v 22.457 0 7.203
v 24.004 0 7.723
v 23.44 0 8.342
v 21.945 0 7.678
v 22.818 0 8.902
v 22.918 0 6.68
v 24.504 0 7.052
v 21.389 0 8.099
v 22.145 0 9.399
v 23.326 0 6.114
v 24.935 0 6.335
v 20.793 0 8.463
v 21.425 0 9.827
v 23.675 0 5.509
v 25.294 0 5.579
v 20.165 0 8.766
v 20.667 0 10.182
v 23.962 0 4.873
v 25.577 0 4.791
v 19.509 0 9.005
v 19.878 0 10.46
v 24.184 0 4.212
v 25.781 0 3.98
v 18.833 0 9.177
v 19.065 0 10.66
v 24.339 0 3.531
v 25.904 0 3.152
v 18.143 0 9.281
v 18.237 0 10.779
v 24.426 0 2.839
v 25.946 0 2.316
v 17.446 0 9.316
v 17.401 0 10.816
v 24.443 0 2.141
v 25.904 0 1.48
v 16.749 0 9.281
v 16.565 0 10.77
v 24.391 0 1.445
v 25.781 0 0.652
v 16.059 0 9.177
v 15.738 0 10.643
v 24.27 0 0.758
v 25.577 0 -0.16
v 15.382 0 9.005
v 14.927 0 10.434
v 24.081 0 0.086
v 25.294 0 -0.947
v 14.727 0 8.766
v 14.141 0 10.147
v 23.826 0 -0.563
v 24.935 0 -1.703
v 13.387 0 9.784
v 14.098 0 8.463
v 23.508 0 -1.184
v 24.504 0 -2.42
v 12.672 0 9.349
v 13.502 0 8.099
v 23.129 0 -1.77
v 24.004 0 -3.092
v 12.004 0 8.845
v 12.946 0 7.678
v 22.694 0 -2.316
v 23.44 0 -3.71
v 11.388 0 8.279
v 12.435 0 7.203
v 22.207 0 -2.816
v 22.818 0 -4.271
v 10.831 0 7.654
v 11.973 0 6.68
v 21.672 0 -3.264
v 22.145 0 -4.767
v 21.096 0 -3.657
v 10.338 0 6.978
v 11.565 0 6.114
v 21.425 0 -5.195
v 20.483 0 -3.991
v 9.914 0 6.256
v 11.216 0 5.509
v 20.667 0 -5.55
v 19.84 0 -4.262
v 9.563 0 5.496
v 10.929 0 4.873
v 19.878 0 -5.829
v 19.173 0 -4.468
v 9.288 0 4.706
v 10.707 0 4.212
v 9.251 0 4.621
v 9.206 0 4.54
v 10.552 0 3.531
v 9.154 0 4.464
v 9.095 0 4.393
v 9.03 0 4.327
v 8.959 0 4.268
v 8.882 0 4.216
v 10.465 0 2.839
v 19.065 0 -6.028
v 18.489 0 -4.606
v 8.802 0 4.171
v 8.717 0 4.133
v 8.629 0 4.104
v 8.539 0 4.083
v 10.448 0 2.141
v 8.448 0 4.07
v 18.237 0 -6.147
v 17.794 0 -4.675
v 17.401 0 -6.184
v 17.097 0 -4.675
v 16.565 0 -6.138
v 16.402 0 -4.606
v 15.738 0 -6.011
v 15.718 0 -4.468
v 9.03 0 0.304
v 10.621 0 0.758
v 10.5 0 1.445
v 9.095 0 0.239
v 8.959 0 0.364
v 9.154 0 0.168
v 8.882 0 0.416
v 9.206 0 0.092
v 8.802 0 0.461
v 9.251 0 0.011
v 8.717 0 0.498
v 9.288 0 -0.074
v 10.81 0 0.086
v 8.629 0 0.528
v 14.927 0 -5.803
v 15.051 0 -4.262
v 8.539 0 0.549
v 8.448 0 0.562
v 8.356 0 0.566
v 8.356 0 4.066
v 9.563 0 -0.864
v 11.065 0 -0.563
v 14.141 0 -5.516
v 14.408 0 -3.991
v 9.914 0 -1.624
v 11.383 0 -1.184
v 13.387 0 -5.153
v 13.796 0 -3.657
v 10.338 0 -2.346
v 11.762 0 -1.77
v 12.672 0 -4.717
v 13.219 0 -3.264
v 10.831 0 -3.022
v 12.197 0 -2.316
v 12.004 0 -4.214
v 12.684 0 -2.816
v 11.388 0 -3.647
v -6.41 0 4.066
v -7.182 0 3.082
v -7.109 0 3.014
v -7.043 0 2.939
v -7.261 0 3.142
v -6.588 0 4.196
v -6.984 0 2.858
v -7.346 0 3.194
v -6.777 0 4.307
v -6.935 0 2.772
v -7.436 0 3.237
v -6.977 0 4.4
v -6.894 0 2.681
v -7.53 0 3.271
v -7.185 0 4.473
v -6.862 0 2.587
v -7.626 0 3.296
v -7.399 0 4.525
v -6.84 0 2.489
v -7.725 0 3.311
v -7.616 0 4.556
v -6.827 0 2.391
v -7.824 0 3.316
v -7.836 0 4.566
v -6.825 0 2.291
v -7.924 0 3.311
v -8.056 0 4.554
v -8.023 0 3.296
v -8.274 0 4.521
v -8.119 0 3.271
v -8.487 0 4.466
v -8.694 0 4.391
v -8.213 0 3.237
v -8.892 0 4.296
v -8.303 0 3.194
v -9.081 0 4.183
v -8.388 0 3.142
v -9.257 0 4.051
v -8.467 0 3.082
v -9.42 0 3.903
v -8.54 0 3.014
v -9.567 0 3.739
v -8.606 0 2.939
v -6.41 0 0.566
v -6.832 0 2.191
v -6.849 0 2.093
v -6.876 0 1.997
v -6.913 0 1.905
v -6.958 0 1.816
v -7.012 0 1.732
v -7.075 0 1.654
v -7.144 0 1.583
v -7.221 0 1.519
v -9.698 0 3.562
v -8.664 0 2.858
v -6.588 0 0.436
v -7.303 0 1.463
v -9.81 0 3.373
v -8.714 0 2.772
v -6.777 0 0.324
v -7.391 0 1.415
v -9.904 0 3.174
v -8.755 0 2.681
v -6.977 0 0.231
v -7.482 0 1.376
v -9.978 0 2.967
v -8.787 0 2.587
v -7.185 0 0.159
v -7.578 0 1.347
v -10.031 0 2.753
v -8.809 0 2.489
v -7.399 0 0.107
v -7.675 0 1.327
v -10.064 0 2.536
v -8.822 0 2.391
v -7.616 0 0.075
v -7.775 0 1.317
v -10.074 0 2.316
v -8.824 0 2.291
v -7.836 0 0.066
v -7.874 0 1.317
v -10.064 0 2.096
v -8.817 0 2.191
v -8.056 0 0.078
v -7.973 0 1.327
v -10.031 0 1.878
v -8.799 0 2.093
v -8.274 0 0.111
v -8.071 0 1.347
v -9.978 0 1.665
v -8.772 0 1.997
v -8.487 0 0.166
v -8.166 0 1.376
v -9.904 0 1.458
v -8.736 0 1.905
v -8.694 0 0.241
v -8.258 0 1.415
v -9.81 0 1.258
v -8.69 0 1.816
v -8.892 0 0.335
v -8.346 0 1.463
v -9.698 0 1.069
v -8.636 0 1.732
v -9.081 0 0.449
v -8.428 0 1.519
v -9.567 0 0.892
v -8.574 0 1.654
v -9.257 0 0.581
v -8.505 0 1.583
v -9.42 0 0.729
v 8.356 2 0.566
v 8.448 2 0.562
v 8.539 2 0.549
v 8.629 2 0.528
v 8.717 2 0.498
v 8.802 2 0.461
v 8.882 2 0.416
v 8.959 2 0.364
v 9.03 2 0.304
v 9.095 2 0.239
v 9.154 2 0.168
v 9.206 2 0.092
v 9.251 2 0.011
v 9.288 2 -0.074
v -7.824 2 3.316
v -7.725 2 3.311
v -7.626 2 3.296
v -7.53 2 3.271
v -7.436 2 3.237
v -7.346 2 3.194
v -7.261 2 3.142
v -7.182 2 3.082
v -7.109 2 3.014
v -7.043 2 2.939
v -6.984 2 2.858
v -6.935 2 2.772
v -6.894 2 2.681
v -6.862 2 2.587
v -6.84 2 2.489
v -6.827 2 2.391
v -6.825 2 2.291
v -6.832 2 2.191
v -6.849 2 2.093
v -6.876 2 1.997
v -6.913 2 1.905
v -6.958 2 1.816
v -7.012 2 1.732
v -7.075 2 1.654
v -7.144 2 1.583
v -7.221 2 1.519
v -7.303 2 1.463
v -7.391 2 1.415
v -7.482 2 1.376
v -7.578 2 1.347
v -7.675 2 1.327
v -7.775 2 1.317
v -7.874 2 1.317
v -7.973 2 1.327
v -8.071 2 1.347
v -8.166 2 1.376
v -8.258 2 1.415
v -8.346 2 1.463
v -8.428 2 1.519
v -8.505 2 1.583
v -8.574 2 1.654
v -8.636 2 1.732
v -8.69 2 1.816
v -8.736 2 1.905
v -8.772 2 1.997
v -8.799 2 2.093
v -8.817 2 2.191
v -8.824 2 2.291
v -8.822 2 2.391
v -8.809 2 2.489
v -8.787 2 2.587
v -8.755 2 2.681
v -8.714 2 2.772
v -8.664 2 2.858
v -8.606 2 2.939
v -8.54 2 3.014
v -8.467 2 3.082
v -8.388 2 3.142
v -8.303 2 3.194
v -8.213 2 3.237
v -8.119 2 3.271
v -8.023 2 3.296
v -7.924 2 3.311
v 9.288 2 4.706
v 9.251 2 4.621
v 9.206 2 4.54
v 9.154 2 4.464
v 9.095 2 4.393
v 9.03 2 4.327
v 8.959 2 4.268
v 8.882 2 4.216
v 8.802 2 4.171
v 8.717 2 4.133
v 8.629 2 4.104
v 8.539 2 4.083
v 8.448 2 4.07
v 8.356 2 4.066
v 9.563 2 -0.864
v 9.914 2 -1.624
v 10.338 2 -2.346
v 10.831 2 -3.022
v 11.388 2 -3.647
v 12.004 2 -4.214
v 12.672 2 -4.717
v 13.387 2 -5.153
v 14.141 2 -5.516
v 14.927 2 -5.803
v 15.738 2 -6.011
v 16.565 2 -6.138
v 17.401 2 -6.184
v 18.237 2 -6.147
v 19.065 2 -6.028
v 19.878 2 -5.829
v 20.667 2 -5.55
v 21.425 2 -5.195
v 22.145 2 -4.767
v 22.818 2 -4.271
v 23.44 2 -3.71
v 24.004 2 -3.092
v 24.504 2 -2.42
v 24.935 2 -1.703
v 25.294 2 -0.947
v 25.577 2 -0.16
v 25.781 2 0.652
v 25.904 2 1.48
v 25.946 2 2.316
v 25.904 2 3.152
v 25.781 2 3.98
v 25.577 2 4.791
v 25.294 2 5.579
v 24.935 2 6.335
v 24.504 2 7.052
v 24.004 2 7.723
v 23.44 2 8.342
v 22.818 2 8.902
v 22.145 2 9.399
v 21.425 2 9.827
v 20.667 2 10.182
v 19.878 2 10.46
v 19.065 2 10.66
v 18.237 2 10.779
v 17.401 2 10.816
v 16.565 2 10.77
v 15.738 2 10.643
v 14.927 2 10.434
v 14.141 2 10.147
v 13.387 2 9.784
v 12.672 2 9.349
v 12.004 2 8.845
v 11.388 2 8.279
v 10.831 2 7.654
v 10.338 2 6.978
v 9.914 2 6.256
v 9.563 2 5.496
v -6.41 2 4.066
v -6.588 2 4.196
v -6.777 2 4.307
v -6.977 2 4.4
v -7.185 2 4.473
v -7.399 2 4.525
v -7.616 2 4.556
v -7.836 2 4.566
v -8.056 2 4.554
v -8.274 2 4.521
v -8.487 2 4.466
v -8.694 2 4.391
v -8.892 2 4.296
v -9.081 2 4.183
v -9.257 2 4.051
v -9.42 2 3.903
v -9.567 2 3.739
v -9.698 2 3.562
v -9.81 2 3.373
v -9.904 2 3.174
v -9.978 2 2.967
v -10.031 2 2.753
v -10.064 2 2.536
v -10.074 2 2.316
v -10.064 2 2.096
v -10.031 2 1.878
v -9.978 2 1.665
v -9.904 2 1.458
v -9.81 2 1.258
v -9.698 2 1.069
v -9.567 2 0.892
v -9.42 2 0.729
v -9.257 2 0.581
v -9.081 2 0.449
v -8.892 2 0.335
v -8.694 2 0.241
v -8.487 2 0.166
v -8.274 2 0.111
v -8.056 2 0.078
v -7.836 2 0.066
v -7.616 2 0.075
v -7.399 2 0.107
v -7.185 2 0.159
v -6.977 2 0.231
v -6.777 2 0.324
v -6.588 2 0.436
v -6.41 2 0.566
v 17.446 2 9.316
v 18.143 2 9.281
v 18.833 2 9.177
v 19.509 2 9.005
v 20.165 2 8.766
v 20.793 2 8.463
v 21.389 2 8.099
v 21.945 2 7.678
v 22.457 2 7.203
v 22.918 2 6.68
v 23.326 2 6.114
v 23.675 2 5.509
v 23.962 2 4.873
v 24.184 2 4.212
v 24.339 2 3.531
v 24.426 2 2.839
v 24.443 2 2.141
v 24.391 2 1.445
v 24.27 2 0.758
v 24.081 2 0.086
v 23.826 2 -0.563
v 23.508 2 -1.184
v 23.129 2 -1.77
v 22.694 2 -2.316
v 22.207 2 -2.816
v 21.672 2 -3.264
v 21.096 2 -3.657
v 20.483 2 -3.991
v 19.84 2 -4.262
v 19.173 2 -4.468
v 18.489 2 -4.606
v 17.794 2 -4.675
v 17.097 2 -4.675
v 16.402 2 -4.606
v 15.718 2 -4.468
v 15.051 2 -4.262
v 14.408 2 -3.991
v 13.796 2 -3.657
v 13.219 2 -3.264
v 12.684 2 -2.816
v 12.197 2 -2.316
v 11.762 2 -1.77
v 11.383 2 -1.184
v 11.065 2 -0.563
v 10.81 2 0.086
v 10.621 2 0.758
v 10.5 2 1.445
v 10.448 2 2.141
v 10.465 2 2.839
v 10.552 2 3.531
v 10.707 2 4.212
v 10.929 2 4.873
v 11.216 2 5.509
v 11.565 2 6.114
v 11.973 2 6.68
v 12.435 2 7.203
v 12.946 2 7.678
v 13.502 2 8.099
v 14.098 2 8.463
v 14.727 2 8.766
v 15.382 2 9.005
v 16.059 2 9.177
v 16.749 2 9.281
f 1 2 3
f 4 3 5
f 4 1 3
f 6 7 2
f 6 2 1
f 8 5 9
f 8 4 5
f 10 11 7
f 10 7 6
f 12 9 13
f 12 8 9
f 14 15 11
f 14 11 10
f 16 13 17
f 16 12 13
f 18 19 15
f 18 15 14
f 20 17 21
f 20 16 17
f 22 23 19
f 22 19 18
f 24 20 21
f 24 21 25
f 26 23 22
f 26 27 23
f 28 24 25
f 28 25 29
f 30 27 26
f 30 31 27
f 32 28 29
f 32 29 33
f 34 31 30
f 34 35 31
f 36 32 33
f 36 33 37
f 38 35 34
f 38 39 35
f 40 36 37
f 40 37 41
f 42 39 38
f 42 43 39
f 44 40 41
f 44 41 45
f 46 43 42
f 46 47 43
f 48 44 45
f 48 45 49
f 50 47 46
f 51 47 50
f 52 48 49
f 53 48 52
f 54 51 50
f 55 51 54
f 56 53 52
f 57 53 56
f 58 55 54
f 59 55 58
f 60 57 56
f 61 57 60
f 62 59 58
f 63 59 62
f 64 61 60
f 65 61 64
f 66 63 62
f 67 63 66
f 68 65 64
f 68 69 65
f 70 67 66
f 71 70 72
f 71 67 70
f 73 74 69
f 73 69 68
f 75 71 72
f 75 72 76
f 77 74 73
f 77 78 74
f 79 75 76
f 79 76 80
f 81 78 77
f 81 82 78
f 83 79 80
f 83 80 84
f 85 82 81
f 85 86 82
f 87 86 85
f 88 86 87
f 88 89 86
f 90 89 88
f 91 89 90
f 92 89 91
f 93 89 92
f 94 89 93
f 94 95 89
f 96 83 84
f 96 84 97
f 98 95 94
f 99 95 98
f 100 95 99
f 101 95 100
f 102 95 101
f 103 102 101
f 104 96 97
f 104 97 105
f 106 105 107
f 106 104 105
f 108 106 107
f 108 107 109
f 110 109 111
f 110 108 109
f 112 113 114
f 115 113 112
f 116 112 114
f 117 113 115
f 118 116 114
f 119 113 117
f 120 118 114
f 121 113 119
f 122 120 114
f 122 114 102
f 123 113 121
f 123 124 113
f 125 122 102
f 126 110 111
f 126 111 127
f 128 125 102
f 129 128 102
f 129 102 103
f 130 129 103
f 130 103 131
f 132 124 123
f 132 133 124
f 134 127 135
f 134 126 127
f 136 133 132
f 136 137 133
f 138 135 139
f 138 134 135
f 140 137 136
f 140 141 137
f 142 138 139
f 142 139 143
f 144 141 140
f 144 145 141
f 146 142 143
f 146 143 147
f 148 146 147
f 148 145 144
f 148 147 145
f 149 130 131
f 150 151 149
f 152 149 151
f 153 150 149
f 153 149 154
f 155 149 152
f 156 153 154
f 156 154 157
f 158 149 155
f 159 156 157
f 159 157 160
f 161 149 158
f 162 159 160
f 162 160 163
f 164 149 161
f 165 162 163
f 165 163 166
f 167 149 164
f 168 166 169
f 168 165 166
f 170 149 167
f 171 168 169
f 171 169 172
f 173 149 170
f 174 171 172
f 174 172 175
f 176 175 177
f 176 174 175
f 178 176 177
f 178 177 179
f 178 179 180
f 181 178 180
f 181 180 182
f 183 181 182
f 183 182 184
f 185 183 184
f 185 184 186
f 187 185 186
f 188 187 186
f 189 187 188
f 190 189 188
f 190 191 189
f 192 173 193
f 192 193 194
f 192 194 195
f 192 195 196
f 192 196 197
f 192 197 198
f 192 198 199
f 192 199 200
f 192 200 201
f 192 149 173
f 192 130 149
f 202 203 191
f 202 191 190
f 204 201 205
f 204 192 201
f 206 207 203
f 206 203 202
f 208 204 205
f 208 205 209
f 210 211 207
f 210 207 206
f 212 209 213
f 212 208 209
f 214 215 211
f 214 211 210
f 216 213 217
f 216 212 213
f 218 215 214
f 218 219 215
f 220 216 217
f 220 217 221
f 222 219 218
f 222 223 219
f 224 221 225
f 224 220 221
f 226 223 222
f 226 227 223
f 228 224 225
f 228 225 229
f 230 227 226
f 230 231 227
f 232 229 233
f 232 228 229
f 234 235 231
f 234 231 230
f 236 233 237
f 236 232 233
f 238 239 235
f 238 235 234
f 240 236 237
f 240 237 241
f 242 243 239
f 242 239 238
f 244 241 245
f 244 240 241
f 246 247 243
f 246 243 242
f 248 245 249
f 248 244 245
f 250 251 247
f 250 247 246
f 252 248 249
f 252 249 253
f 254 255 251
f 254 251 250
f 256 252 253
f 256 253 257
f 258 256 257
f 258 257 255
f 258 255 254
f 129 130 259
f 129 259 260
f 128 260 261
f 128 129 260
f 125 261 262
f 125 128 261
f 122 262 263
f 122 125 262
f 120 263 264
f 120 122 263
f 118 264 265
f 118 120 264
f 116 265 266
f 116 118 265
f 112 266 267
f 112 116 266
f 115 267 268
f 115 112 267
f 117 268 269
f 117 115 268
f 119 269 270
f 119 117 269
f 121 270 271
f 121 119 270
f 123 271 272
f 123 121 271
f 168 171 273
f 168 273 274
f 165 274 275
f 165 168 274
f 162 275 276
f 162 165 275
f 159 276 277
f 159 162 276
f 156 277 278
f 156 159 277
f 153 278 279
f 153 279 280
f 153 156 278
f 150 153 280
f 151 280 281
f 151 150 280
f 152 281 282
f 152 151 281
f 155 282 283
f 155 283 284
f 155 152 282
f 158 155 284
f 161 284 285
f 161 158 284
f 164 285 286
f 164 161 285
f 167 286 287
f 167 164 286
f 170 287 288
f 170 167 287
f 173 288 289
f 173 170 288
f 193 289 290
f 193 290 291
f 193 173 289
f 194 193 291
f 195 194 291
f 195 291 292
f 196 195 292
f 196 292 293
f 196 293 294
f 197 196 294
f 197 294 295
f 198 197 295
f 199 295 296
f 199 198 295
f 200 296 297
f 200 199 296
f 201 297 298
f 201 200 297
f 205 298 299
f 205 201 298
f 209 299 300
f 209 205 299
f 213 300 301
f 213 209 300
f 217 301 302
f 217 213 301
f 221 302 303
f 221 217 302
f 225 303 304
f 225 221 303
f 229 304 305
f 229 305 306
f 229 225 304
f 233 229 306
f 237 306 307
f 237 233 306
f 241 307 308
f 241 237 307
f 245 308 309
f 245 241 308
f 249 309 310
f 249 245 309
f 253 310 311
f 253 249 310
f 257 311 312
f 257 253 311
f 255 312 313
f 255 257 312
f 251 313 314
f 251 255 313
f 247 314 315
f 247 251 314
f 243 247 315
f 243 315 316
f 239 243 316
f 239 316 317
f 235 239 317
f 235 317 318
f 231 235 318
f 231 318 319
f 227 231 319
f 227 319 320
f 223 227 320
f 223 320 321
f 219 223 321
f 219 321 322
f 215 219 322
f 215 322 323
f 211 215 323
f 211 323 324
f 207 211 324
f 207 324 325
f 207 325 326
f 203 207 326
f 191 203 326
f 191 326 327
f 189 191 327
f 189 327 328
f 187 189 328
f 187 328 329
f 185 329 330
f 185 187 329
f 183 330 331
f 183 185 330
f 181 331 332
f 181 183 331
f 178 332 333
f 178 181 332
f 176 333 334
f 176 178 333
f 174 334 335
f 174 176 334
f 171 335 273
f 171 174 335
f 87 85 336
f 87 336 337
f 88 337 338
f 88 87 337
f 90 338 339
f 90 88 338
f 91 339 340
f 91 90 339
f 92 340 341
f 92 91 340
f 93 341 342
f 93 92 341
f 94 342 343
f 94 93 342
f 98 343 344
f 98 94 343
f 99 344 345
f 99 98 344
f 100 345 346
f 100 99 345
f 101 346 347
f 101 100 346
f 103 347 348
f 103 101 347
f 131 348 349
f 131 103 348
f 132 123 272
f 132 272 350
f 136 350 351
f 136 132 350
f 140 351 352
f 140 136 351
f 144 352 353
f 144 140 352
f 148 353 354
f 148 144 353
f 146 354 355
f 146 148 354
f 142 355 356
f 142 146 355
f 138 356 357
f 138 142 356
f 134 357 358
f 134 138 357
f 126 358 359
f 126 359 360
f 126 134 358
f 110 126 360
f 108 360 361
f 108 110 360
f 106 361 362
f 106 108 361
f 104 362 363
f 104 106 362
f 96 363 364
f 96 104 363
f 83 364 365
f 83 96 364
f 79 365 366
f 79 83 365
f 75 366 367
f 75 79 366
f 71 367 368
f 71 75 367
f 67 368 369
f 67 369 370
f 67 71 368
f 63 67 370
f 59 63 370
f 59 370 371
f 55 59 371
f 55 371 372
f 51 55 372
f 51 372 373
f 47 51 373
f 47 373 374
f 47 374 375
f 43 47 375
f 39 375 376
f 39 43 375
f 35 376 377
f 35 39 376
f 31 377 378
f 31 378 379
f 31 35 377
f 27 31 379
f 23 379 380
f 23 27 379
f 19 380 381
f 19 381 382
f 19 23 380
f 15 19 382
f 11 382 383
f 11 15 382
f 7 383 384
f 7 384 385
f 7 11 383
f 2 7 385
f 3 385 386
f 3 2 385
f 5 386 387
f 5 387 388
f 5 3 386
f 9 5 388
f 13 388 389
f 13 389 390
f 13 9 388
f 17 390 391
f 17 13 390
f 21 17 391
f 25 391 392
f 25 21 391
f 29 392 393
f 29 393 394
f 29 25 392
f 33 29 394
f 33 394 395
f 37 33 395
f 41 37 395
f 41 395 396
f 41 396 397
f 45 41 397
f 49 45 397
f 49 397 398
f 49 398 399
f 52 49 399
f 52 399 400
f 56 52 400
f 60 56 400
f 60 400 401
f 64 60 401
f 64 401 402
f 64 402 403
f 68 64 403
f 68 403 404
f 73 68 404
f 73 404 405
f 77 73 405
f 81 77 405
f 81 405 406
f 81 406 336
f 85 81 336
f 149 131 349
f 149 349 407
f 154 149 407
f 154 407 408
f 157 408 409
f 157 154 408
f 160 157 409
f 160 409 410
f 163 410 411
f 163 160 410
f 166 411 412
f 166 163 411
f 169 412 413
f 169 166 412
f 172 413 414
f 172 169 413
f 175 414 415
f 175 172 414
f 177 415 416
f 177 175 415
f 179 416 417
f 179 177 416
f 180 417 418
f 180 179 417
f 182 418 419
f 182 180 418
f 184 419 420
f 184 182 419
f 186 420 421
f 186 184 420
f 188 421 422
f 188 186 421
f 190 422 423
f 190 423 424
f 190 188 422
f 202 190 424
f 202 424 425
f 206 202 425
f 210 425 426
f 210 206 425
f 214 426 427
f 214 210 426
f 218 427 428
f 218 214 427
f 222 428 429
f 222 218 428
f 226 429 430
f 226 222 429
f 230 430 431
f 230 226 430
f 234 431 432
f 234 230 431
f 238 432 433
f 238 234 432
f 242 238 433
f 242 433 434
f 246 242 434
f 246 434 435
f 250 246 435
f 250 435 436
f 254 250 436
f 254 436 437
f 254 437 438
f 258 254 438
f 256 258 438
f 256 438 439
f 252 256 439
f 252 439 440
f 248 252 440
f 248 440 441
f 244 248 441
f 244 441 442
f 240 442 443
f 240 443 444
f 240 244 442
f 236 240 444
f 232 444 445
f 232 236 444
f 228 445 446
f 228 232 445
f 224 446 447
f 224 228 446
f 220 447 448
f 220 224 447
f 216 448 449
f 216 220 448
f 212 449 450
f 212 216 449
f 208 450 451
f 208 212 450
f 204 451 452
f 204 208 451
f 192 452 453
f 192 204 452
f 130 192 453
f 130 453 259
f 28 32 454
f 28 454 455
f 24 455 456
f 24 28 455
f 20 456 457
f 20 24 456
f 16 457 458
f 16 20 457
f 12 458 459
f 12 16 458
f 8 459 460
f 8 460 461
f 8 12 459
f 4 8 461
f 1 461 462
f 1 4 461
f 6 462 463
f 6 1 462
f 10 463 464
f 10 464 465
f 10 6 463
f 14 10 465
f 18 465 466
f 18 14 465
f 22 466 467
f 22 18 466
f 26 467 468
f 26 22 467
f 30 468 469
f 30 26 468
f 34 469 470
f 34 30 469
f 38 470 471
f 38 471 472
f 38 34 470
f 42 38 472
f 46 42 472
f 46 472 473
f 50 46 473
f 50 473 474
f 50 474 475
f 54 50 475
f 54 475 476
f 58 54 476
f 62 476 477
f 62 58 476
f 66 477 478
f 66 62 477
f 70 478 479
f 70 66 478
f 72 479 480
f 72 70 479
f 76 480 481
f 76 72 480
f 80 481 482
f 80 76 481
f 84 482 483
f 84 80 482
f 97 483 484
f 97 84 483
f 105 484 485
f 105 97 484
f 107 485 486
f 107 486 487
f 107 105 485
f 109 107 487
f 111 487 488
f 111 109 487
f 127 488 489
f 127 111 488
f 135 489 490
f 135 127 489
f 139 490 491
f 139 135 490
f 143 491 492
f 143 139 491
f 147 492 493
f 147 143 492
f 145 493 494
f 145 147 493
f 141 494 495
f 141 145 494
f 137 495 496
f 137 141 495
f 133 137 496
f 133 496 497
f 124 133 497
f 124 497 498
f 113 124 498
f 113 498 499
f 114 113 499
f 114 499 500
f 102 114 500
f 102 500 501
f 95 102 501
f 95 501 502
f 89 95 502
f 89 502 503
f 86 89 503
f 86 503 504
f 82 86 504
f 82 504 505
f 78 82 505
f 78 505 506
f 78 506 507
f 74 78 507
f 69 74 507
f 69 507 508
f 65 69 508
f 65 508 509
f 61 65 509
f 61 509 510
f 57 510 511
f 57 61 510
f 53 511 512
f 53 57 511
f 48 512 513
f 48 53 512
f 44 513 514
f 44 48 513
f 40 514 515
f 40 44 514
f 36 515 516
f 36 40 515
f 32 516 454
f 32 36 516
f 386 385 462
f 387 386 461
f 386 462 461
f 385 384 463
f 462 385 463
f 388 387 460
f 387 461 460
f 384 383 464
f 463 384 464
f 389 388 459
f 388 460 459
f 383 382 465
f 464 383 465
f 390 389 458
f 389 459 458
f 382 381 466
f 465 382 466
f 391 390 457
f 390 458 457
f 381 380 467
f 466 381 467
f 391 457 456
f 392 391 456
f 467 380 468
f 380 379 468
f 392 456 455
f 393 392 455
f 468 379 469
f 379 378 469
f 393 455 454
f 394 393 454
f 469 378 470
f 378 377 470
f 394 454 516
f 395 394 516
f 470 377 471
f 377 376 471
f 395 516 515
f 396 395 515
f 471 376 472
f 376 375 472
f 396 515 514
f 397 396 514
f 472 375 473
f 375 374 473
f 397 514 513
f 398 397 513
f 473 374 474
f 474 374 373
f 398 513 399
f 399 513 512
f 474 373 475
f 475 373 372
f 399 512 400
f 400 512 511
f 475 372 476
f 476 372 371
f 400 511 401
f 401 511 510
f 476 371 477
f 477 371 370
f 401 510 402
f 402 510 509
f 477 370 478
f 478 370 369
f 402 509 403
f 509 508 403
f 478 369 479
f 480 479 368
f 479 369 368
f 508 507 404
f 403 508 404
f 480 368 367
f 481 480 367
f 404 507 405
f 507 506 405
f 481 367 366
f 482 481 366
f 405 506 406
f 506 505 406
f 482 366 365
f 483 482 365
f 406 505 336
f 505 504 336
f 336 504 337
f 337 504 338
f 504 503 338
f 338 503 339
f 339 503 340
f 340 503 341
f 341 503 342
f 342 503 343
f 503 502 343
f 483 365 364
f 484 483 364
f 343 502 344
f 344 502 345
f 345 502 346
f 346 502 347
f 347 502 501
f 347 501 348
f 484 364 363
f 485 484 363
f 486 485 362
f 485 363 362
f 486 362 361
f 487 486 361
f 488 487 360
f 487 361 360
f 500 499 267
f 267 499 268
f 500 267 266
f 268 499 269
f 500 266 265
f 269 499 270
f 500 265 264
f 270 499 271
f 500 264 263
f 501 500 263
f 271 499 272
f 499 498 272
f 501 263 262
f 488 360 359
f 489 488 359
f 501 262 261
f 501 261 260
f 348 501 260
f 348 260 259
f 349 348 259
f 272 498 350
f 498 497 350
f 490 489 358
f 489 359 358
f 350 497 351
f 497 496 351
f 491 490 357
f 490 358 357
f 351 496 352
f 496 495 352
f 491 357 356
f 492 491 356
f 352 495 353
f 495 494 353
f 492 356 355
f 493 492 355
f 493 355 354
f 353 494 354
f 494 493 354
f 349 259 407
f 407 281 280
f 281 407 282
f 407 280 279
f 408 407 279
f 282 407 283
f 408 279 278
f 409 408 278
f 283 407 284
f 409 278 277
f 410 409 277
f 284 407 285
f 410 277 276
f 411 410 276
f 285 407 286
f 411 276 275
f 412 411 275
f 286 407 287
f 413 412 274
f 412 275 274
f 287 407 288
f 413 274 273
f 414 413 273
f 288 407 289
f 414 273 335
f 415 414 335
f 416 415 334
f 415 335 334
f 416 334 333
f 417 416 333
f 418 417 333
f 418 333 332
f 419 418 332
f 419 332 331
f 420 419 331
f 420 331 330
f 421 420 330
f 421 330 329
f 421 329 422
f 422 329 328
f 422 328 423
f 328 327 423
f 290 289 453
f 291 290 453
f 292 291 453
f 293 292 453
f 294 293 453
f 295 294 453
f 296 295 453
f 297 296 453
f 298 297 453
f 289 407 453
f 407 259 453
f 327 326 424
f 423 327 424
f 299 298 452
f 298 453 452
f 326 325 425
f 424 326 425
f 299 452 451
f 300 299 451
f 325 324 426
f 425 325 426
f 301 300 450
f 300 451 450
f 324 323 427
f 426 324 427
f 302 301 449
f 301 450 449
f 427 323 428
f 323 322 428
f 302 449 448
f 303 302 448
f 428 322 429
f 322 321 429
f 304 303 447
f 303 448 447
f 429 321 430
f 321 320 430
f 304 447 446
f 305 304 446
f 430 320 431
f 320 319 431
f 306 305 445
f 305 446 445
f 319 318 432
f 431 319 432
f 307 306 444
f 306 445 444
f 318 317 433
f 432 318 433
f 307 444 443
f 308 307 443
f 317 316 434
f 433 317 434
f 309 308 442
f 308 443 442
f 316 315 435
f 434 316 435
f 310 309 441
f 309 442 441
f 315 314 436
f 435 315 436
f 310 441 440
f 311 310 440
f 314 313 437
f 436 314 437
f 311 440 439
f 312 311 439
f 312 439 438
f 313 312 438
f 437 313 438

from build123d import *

# Parameters (mm, degrees)
SKETCH1_R           = 7
SKETCH1_R_2         = 1
BOSS_EXTRUDE1_DEPTH = 2


with BuildPart() as part:
    # Sketch1 → Boss-Extrude1 (new body)
    with BuildSketch(Plane(origin=(0, 0, 0), x_dir=(1, 0, 0), z_dir=(0, 1, 0))):
        with BuildLine():
            Line((-6.410211793, -0.565826241), (8.355574645, -0.565826241))
            ThreePointArc((8.355574645, -0.565826241), (8.921122441, -0.390541761), (9.288406736, 0.07386238))
            ThreePointArc((9.288406736, 0.07386238), (25.945574645, -2.315826241), (9.288406736, -4.705514861))
            ThreePointArc((9.288406736, -4.705514861), (8.921122441, -4.24111072), (8.355574645, -4.065826241))
            Line((8.355574645, -4.065826241), (-6.410211793, -4.065826241))
            ThreePointArc((-6.410211793, -4.065826241), (-10.074425355, -2.315826241), (-6.410211793, -0.565826241))
        make_face()
        with Locations(Location((17.445574645, -2.315826241, 0), (0, 0, 270))):
            Circle(SKETCH1_R, mode=Mode.SUBTRACT)
        with Locations(Location((-7.824425355, -2.315826241, 0), (0, 0, 270))):
            Circle(SKETCH1_R_2, mode=Mode.SUBTRACT)
    extrude(amount=BOSS_EXTRUDE1_DEPTH)


solid = part.part
